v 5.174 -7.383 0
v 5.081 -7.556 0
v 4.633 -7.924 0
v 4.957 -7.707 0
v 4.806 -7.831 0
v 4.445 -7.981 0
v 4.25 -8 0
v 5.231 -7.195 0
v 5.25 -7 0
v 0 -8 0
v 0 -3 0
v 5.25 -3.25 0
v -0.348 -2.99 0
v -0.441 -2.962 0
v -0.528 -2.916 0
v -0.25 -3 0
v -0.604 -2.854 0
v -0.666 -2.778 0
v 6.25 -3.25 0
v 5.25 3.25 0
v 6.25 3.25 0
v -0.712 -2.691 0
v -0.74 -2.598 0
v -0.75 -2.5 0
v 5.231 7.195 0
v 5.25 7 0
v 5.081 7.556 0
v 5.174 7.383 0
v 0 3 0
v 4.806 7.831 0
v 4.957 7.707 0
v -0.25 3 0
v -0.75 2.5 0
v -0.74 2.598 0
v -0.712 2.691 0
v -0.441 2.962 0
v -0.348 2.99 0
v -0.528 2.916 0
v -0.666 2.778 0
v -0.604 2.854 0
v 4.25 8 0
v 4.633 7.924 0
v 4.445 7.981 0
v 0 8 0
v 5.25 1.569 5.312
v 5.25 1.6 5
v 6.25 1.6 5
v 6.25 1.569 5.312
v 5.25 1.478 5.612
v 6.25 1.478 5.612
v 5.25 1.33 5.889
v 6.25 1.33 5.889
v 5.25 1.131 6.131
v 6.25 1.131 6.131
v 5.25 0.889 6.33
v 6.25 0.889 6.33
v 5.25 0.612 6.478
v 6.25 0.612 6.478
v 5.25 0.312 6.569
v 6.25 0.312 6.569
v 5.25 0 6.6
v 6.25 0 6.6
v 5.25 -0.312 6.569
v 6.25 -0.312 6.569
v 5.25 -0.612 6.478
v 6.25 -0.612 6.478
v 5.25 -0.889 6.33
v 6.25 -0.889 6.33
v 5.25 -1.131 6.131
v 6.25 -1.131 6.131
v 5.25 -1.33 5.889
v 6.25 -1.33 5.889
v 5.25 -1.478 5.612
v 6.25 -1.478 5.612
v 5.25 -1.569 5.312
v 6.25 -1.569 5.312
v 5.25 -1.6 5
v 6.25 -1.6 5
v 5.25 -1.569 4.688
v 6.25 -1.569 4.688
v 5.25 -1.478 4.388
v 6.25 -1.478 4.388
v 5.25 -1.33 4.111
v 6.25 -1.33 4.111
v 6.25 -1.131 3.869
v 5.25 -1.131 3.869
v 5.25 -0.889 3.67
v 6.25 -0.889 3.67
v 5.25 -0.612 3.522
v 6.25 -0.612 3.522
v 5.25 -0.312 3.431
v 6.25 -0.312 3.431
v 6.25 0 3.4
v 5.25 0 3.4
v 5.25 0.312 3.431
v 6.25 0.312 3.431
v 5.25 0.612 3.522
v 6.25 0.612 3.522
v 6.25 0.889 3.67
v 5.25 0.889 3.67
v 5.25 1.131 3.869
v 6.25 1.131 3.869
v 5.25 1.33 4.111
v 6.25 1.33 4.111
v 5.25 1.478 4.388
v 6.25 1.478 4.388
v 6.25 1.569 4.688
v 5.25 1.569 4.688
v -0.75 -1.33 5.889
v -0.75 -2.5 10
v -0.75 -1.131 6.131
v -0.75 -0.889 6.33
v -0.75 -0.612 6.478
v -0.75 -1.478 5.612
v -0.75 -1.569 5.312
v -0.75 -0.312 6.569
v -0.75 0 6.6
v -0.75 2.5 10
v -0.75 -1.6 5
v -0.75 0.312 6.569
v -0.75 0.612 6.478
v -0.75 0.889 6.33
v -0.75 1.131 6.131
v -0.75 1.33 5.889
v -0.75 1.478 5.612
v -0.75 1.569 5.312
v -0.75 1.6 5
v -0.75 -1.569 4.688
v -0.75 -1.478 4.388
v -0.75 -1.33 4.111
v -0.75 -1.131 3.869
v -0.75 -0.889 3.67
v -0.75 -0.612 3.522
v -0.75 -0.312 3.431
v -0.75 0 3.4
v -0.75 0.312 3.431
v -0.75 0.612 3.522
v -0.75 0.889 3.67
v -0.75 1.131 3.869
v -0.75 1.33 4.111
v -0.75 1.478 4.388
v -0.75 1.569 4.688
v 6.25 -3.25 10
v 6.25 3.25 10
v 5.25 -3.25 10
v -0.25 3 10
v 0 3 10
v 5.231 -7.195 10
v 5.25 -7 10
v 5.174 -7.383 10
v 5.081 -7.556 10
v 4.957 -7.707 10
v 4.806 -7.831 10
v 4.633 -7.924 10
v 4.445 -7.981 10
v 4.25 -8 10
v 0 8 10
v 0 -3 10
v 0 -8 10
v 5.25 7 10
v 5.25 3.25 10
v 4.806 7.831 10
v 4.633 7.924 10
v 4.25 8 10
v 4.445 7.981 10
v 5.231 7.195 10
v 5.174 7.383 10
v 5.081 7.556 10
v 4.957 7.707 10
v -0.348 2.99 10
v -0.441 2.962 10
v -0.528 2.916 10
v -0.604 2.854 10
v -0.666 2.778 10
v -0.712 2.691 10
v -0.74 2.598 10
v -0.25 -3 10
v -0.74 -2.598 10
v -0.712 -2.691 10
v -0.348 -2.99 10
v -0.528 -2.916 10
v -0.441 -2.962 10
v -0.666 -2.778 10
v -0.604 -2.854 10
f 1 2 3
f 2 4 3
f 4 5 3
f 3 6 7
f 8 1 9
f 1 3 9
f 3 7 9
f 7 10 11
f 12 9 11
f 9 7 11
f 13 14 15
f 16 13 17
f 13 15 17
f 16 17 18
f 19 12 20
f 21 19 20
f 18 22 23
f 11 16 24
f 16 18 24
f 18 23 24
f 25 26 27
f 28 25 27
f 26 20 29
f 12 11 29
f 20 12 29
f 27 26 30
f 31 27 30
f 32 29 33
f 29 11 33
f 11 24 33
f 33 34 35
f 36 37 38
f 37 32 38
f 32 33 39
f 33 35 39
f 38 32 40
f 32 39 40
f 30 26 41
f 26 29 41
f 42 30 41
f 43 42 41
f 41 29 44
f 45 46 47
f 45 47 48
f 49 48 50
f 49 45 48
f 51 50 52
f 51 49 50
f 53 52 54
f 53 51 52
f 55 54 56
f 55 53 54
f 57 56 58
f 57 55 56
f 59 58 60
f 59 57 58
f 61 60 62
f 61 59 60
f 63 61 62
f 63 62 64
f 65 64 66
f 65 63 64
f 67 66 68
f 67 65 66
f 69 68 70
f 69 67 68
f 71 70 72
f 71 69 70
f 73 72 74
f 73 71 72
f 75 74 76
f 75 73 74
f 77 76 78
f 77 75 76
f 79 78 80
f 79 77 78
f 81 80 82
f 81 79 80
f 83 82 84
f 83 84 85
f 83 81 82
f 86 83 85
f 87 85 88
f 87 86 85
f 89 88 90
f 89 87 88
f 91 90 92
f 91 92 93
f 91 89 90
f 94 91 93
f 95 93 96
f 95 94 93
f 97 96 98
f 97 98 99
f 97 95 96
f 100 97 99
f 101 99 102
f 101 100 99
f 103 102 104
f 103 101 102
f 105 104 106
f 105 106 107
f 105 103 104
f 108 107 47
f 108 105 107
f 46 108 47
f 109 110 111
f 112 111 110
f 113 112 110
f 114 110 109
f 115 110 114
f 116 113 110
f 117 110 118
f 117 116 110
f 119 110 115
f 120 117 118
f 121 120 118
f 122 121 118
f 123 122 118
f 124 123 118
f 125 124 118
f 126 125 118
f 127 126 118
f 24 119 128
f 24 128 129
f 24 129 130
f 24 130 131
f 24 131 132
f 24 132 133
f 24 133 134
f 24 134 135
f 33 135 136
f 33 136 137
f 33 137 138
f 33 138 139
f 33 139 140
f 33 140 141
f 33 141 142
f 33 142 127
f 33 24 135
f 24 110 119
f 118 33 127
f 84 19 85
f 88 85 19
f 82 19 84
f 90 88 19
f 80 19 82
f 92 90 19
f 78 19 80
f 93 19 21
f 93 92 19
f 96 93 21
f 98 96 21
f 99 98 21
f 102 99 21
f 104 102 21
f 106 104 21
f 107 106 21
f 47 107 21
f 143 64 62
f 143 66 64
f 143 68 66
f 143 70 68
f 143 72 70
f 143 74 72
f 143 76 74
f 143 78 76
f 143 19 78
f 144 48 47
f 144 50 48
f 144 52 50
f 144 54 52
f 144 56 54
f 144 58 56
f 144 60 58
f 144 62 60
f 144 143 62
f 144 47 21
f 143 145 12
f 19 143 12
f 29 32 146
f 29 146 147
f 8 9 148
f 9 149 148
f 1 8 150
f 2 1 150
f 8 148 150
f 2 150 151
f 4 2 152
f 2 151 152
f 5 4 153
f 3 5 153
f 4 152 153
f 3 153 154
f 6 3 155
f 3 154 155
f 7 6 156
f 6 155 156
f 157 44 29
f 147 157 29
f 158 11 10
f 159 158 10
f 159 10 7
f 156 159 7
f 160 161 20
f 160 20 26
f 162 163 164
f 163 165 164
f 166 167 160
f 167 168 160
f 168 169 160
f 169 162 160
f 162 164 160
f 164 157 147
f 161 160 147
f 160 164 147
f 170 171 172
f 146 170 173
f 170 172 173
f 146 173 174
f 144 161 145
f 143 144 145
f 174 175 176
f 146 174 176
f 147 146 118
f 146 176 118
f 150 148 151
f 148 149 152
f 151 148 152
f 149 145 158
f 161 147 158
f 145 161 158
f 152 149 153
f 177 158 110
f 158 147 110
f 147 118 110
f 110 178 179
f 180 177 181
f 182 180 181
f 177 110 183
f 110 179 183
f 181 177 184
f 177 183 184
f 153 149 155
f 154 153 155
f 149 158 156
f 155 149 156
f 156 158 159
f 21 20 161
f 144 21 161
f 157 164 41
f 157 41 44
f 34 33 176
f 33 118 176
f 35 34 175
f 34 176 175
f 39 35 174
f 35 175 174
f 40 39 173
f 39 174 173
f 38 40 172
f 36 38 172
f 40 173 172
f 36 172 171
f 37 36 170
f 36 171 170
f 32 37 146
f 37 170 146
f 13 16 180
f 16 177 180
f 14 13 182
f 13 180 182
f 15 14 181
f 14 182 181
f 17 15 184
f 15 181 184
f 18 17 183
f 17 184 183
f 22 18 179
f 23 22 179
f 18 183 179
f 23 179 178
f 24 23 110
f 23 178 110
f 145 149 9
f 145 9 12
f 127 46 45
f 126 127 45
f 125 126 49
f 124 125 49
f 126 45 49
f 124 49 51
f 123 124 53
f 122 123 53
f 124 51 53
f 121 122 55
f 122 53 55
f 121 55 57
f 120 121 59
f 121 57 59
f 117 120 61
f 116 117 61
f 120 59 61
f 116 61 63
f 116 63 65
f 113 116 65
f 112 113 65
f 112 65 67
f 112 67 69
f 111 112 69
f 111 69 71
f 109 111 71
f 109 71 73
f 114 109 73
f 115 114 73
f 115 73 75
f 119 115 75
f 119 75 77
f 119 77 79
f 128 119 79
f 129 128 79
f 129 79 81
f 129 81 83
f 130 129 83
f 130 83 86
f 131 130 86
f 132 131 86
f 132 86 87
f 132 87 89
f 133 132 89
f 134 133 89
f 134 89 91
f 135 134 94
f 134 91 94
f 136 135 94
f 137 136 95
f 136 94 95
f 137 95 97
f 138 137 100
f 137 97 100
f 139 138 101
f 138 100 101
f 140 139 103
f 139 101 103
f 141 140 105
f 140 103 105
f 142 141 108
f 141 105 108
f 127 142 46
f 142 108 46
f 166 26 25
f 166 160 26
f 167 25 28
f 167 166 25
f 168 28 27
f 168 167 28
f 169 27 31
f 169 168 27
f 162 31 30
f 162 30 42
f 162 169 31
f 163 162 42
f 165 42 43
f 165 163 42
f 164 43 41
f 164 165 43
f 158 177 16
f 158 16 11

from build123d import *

# Parameters (mm, degrees)
F0_W     = 0.75
F0_H     = 6
F1_DEPTH = 10
F2_R     = 1.6
F3_DEPTH = 25
F4_DEPTH = 1
F5_R     = 1
F6_R     = 0.5


with BuildPart() as f1:
    # F0 (on Top) → F1 (new body)
    with BuildSketch(Plane.XY):
        with Locations((-0.375, 0)):
            Rectangle(F0_W, F0_H)
        Polygon((0, 8), (0, 3), (0, -3), (0, -8), (5.25, -8), (5.25, 8), align=None)
    extrude(amount=F1_DEPTH)

    # F2 (on face) → F3 (cut)
    with BuildSketch(Plane.YZ.offset(5.25)):
        with Locations((0, 5)):
            Circle(F2_R)
    extrude(amount=-F3_DEPTH, mode=Mode.SUBTRACT)

    # F2 (on face) → F4 (join)
    with BuildSketch(Plane.YZ.offset(5.25)):
        with BuildLine():
            ThreePointArc((-3.25, 5), (0, 8.25), (3.25, 5))
            Line((3.25, 5), (3.25, 10))
            Line((3.25, 10), (-3.25, 10))
            Line((-3.25, 10), (-3.25, 5))
        make_face()
        with BuildLine():
            ThreePointArc((-3.25, 5), (0, 1.75), (3.25, 5))
            ThreePointArc((3.25, 5), (0, 8.25), (-3.25, 5))
        make_face()
        with Locations((0, 5)):
            Circle(F2_R, mode=Mode.SUBTRACT)
        with BuildLine():
            Line((3.25, 0), (3.25, 5))
            ThreePointArc((3.25, 5), (0, 1.75), (-3.25, 5))
            Line((-3.25, 5), (-3.25, 0))
            Line((-3.25, 0), (3.25, 0))
        make_face()
    extrude(amount=F4_DEPTH)

    # F5
    f5_edges = [f1.edges().sort_by_distance(p)[0] for p in [
        (5.25, -8, 5),
        (5.25, 8, 5),
    ]]
    fillet(f5_edges, radius=F5_R)

    # F6
    f6_edges = [f1.edges().sort_by_distance(p)[0] for p in [
        (-0.75, -3, 5),
        (-0.75, 3, 5),
    ]]
    fillet(f6_edges, radius=F6_R)


solid = f1.part
